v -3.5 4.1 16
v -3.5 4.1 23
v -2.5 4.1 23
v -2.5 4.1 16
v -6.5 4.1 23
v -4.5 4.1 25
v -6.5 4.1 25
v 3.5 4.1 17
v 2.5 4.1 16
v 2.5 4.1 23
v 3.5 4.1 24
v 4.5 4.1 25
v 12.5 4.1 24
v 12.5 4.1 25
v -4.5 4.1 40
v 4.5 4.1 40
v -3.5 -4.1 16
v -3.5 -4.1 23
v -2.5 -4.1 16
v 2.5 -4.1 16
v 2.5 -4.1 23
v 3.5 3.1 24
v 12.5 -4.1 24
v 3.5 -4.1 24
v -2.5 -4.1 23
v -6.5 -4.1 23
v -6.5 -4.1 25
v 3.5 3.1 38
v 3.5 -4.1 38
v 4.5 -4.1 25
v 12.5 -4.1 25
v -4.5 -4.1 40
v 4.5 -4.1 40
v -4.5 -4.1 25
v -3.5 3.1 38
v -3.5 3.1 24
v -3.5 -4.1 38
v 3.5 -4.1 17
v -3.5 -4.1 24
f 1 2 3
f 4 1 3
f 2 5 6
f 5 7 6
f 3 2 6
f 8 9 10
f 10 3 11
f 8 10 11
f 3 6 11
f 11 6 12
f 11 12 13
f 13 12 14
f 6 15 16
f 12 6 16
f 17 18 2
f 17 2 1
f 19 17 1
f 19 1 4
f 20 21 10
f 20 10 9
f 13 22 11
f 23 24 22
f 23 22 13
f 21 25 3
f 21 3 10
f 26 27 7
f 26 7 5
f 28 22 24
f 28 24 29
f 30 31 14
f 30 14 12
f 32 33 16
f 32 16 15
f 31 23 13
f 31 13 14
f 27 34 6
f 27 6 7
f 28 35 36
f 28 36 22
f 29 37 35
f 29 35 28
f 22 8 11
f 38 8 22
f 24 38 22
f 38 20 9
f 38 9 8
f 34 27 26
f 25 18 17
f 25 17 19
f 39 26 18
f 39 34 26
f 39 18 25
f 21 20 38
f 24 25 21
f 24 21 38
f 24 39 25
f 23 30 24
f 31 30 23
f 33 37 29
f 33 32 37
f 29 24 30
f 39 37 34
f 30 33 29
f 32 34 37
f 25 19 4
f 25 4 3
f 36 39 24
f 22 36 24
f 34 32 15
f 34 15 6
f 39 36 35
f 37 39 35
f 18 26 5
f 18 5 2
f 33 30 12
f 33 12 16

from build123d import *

# Parameters (mm, degrees)
SKETCH011_W      = 7
SKETCH011_H      = 14
EXTRUDE012_DEPTH = 10
EXTRUDE_DEPTH    = 8.2


with BuildPart() as extrude012:
    # Sketch011 → Extrude012 (new body)
    with BuildSketch(Plane.XZ.offset(4.5)):
        with Locations((0, 31)):
            Rectangle(SKETCH011_W, SKETCH011_H)
    extrude(amount=EXTRUDE012_DEPTH)


with BuildPart() as extrude012_1:
    # Extrude012 placement: moved
    add(extrude012.part.moved(Location((0, 7.6, 0))))


with BuildPart() as button001:
    # Sketch → Extrude (new body)
    with BuildSketch(Plane.XZ.offset(4.5)):
        Polygon((-6.5, 23), (-3.5, 23), (-3.5, 16), (-2.5, 16), (-2.5, 23), (2.5, 23), (2.5, 16), (3.5, 17), (3.5, 24), (12.5, 24), (12.5, 25), (4.5, 25), (4.5, 40), (-4.5, 40), (-4.5, 25), (-6.5, 25), align=None)
    extrude(amount=-EXTRUDE_DEPTH)


with BuildPart() as button001_1:
    # Extrude placement: moved
    add(button001.part.moved(Location((0, 0.4, 0))))

    # Cut001: cut Extrude012
    add(extrude012_1.part, mode=Mode.SUBTRACT)


solid = button001_1.part
